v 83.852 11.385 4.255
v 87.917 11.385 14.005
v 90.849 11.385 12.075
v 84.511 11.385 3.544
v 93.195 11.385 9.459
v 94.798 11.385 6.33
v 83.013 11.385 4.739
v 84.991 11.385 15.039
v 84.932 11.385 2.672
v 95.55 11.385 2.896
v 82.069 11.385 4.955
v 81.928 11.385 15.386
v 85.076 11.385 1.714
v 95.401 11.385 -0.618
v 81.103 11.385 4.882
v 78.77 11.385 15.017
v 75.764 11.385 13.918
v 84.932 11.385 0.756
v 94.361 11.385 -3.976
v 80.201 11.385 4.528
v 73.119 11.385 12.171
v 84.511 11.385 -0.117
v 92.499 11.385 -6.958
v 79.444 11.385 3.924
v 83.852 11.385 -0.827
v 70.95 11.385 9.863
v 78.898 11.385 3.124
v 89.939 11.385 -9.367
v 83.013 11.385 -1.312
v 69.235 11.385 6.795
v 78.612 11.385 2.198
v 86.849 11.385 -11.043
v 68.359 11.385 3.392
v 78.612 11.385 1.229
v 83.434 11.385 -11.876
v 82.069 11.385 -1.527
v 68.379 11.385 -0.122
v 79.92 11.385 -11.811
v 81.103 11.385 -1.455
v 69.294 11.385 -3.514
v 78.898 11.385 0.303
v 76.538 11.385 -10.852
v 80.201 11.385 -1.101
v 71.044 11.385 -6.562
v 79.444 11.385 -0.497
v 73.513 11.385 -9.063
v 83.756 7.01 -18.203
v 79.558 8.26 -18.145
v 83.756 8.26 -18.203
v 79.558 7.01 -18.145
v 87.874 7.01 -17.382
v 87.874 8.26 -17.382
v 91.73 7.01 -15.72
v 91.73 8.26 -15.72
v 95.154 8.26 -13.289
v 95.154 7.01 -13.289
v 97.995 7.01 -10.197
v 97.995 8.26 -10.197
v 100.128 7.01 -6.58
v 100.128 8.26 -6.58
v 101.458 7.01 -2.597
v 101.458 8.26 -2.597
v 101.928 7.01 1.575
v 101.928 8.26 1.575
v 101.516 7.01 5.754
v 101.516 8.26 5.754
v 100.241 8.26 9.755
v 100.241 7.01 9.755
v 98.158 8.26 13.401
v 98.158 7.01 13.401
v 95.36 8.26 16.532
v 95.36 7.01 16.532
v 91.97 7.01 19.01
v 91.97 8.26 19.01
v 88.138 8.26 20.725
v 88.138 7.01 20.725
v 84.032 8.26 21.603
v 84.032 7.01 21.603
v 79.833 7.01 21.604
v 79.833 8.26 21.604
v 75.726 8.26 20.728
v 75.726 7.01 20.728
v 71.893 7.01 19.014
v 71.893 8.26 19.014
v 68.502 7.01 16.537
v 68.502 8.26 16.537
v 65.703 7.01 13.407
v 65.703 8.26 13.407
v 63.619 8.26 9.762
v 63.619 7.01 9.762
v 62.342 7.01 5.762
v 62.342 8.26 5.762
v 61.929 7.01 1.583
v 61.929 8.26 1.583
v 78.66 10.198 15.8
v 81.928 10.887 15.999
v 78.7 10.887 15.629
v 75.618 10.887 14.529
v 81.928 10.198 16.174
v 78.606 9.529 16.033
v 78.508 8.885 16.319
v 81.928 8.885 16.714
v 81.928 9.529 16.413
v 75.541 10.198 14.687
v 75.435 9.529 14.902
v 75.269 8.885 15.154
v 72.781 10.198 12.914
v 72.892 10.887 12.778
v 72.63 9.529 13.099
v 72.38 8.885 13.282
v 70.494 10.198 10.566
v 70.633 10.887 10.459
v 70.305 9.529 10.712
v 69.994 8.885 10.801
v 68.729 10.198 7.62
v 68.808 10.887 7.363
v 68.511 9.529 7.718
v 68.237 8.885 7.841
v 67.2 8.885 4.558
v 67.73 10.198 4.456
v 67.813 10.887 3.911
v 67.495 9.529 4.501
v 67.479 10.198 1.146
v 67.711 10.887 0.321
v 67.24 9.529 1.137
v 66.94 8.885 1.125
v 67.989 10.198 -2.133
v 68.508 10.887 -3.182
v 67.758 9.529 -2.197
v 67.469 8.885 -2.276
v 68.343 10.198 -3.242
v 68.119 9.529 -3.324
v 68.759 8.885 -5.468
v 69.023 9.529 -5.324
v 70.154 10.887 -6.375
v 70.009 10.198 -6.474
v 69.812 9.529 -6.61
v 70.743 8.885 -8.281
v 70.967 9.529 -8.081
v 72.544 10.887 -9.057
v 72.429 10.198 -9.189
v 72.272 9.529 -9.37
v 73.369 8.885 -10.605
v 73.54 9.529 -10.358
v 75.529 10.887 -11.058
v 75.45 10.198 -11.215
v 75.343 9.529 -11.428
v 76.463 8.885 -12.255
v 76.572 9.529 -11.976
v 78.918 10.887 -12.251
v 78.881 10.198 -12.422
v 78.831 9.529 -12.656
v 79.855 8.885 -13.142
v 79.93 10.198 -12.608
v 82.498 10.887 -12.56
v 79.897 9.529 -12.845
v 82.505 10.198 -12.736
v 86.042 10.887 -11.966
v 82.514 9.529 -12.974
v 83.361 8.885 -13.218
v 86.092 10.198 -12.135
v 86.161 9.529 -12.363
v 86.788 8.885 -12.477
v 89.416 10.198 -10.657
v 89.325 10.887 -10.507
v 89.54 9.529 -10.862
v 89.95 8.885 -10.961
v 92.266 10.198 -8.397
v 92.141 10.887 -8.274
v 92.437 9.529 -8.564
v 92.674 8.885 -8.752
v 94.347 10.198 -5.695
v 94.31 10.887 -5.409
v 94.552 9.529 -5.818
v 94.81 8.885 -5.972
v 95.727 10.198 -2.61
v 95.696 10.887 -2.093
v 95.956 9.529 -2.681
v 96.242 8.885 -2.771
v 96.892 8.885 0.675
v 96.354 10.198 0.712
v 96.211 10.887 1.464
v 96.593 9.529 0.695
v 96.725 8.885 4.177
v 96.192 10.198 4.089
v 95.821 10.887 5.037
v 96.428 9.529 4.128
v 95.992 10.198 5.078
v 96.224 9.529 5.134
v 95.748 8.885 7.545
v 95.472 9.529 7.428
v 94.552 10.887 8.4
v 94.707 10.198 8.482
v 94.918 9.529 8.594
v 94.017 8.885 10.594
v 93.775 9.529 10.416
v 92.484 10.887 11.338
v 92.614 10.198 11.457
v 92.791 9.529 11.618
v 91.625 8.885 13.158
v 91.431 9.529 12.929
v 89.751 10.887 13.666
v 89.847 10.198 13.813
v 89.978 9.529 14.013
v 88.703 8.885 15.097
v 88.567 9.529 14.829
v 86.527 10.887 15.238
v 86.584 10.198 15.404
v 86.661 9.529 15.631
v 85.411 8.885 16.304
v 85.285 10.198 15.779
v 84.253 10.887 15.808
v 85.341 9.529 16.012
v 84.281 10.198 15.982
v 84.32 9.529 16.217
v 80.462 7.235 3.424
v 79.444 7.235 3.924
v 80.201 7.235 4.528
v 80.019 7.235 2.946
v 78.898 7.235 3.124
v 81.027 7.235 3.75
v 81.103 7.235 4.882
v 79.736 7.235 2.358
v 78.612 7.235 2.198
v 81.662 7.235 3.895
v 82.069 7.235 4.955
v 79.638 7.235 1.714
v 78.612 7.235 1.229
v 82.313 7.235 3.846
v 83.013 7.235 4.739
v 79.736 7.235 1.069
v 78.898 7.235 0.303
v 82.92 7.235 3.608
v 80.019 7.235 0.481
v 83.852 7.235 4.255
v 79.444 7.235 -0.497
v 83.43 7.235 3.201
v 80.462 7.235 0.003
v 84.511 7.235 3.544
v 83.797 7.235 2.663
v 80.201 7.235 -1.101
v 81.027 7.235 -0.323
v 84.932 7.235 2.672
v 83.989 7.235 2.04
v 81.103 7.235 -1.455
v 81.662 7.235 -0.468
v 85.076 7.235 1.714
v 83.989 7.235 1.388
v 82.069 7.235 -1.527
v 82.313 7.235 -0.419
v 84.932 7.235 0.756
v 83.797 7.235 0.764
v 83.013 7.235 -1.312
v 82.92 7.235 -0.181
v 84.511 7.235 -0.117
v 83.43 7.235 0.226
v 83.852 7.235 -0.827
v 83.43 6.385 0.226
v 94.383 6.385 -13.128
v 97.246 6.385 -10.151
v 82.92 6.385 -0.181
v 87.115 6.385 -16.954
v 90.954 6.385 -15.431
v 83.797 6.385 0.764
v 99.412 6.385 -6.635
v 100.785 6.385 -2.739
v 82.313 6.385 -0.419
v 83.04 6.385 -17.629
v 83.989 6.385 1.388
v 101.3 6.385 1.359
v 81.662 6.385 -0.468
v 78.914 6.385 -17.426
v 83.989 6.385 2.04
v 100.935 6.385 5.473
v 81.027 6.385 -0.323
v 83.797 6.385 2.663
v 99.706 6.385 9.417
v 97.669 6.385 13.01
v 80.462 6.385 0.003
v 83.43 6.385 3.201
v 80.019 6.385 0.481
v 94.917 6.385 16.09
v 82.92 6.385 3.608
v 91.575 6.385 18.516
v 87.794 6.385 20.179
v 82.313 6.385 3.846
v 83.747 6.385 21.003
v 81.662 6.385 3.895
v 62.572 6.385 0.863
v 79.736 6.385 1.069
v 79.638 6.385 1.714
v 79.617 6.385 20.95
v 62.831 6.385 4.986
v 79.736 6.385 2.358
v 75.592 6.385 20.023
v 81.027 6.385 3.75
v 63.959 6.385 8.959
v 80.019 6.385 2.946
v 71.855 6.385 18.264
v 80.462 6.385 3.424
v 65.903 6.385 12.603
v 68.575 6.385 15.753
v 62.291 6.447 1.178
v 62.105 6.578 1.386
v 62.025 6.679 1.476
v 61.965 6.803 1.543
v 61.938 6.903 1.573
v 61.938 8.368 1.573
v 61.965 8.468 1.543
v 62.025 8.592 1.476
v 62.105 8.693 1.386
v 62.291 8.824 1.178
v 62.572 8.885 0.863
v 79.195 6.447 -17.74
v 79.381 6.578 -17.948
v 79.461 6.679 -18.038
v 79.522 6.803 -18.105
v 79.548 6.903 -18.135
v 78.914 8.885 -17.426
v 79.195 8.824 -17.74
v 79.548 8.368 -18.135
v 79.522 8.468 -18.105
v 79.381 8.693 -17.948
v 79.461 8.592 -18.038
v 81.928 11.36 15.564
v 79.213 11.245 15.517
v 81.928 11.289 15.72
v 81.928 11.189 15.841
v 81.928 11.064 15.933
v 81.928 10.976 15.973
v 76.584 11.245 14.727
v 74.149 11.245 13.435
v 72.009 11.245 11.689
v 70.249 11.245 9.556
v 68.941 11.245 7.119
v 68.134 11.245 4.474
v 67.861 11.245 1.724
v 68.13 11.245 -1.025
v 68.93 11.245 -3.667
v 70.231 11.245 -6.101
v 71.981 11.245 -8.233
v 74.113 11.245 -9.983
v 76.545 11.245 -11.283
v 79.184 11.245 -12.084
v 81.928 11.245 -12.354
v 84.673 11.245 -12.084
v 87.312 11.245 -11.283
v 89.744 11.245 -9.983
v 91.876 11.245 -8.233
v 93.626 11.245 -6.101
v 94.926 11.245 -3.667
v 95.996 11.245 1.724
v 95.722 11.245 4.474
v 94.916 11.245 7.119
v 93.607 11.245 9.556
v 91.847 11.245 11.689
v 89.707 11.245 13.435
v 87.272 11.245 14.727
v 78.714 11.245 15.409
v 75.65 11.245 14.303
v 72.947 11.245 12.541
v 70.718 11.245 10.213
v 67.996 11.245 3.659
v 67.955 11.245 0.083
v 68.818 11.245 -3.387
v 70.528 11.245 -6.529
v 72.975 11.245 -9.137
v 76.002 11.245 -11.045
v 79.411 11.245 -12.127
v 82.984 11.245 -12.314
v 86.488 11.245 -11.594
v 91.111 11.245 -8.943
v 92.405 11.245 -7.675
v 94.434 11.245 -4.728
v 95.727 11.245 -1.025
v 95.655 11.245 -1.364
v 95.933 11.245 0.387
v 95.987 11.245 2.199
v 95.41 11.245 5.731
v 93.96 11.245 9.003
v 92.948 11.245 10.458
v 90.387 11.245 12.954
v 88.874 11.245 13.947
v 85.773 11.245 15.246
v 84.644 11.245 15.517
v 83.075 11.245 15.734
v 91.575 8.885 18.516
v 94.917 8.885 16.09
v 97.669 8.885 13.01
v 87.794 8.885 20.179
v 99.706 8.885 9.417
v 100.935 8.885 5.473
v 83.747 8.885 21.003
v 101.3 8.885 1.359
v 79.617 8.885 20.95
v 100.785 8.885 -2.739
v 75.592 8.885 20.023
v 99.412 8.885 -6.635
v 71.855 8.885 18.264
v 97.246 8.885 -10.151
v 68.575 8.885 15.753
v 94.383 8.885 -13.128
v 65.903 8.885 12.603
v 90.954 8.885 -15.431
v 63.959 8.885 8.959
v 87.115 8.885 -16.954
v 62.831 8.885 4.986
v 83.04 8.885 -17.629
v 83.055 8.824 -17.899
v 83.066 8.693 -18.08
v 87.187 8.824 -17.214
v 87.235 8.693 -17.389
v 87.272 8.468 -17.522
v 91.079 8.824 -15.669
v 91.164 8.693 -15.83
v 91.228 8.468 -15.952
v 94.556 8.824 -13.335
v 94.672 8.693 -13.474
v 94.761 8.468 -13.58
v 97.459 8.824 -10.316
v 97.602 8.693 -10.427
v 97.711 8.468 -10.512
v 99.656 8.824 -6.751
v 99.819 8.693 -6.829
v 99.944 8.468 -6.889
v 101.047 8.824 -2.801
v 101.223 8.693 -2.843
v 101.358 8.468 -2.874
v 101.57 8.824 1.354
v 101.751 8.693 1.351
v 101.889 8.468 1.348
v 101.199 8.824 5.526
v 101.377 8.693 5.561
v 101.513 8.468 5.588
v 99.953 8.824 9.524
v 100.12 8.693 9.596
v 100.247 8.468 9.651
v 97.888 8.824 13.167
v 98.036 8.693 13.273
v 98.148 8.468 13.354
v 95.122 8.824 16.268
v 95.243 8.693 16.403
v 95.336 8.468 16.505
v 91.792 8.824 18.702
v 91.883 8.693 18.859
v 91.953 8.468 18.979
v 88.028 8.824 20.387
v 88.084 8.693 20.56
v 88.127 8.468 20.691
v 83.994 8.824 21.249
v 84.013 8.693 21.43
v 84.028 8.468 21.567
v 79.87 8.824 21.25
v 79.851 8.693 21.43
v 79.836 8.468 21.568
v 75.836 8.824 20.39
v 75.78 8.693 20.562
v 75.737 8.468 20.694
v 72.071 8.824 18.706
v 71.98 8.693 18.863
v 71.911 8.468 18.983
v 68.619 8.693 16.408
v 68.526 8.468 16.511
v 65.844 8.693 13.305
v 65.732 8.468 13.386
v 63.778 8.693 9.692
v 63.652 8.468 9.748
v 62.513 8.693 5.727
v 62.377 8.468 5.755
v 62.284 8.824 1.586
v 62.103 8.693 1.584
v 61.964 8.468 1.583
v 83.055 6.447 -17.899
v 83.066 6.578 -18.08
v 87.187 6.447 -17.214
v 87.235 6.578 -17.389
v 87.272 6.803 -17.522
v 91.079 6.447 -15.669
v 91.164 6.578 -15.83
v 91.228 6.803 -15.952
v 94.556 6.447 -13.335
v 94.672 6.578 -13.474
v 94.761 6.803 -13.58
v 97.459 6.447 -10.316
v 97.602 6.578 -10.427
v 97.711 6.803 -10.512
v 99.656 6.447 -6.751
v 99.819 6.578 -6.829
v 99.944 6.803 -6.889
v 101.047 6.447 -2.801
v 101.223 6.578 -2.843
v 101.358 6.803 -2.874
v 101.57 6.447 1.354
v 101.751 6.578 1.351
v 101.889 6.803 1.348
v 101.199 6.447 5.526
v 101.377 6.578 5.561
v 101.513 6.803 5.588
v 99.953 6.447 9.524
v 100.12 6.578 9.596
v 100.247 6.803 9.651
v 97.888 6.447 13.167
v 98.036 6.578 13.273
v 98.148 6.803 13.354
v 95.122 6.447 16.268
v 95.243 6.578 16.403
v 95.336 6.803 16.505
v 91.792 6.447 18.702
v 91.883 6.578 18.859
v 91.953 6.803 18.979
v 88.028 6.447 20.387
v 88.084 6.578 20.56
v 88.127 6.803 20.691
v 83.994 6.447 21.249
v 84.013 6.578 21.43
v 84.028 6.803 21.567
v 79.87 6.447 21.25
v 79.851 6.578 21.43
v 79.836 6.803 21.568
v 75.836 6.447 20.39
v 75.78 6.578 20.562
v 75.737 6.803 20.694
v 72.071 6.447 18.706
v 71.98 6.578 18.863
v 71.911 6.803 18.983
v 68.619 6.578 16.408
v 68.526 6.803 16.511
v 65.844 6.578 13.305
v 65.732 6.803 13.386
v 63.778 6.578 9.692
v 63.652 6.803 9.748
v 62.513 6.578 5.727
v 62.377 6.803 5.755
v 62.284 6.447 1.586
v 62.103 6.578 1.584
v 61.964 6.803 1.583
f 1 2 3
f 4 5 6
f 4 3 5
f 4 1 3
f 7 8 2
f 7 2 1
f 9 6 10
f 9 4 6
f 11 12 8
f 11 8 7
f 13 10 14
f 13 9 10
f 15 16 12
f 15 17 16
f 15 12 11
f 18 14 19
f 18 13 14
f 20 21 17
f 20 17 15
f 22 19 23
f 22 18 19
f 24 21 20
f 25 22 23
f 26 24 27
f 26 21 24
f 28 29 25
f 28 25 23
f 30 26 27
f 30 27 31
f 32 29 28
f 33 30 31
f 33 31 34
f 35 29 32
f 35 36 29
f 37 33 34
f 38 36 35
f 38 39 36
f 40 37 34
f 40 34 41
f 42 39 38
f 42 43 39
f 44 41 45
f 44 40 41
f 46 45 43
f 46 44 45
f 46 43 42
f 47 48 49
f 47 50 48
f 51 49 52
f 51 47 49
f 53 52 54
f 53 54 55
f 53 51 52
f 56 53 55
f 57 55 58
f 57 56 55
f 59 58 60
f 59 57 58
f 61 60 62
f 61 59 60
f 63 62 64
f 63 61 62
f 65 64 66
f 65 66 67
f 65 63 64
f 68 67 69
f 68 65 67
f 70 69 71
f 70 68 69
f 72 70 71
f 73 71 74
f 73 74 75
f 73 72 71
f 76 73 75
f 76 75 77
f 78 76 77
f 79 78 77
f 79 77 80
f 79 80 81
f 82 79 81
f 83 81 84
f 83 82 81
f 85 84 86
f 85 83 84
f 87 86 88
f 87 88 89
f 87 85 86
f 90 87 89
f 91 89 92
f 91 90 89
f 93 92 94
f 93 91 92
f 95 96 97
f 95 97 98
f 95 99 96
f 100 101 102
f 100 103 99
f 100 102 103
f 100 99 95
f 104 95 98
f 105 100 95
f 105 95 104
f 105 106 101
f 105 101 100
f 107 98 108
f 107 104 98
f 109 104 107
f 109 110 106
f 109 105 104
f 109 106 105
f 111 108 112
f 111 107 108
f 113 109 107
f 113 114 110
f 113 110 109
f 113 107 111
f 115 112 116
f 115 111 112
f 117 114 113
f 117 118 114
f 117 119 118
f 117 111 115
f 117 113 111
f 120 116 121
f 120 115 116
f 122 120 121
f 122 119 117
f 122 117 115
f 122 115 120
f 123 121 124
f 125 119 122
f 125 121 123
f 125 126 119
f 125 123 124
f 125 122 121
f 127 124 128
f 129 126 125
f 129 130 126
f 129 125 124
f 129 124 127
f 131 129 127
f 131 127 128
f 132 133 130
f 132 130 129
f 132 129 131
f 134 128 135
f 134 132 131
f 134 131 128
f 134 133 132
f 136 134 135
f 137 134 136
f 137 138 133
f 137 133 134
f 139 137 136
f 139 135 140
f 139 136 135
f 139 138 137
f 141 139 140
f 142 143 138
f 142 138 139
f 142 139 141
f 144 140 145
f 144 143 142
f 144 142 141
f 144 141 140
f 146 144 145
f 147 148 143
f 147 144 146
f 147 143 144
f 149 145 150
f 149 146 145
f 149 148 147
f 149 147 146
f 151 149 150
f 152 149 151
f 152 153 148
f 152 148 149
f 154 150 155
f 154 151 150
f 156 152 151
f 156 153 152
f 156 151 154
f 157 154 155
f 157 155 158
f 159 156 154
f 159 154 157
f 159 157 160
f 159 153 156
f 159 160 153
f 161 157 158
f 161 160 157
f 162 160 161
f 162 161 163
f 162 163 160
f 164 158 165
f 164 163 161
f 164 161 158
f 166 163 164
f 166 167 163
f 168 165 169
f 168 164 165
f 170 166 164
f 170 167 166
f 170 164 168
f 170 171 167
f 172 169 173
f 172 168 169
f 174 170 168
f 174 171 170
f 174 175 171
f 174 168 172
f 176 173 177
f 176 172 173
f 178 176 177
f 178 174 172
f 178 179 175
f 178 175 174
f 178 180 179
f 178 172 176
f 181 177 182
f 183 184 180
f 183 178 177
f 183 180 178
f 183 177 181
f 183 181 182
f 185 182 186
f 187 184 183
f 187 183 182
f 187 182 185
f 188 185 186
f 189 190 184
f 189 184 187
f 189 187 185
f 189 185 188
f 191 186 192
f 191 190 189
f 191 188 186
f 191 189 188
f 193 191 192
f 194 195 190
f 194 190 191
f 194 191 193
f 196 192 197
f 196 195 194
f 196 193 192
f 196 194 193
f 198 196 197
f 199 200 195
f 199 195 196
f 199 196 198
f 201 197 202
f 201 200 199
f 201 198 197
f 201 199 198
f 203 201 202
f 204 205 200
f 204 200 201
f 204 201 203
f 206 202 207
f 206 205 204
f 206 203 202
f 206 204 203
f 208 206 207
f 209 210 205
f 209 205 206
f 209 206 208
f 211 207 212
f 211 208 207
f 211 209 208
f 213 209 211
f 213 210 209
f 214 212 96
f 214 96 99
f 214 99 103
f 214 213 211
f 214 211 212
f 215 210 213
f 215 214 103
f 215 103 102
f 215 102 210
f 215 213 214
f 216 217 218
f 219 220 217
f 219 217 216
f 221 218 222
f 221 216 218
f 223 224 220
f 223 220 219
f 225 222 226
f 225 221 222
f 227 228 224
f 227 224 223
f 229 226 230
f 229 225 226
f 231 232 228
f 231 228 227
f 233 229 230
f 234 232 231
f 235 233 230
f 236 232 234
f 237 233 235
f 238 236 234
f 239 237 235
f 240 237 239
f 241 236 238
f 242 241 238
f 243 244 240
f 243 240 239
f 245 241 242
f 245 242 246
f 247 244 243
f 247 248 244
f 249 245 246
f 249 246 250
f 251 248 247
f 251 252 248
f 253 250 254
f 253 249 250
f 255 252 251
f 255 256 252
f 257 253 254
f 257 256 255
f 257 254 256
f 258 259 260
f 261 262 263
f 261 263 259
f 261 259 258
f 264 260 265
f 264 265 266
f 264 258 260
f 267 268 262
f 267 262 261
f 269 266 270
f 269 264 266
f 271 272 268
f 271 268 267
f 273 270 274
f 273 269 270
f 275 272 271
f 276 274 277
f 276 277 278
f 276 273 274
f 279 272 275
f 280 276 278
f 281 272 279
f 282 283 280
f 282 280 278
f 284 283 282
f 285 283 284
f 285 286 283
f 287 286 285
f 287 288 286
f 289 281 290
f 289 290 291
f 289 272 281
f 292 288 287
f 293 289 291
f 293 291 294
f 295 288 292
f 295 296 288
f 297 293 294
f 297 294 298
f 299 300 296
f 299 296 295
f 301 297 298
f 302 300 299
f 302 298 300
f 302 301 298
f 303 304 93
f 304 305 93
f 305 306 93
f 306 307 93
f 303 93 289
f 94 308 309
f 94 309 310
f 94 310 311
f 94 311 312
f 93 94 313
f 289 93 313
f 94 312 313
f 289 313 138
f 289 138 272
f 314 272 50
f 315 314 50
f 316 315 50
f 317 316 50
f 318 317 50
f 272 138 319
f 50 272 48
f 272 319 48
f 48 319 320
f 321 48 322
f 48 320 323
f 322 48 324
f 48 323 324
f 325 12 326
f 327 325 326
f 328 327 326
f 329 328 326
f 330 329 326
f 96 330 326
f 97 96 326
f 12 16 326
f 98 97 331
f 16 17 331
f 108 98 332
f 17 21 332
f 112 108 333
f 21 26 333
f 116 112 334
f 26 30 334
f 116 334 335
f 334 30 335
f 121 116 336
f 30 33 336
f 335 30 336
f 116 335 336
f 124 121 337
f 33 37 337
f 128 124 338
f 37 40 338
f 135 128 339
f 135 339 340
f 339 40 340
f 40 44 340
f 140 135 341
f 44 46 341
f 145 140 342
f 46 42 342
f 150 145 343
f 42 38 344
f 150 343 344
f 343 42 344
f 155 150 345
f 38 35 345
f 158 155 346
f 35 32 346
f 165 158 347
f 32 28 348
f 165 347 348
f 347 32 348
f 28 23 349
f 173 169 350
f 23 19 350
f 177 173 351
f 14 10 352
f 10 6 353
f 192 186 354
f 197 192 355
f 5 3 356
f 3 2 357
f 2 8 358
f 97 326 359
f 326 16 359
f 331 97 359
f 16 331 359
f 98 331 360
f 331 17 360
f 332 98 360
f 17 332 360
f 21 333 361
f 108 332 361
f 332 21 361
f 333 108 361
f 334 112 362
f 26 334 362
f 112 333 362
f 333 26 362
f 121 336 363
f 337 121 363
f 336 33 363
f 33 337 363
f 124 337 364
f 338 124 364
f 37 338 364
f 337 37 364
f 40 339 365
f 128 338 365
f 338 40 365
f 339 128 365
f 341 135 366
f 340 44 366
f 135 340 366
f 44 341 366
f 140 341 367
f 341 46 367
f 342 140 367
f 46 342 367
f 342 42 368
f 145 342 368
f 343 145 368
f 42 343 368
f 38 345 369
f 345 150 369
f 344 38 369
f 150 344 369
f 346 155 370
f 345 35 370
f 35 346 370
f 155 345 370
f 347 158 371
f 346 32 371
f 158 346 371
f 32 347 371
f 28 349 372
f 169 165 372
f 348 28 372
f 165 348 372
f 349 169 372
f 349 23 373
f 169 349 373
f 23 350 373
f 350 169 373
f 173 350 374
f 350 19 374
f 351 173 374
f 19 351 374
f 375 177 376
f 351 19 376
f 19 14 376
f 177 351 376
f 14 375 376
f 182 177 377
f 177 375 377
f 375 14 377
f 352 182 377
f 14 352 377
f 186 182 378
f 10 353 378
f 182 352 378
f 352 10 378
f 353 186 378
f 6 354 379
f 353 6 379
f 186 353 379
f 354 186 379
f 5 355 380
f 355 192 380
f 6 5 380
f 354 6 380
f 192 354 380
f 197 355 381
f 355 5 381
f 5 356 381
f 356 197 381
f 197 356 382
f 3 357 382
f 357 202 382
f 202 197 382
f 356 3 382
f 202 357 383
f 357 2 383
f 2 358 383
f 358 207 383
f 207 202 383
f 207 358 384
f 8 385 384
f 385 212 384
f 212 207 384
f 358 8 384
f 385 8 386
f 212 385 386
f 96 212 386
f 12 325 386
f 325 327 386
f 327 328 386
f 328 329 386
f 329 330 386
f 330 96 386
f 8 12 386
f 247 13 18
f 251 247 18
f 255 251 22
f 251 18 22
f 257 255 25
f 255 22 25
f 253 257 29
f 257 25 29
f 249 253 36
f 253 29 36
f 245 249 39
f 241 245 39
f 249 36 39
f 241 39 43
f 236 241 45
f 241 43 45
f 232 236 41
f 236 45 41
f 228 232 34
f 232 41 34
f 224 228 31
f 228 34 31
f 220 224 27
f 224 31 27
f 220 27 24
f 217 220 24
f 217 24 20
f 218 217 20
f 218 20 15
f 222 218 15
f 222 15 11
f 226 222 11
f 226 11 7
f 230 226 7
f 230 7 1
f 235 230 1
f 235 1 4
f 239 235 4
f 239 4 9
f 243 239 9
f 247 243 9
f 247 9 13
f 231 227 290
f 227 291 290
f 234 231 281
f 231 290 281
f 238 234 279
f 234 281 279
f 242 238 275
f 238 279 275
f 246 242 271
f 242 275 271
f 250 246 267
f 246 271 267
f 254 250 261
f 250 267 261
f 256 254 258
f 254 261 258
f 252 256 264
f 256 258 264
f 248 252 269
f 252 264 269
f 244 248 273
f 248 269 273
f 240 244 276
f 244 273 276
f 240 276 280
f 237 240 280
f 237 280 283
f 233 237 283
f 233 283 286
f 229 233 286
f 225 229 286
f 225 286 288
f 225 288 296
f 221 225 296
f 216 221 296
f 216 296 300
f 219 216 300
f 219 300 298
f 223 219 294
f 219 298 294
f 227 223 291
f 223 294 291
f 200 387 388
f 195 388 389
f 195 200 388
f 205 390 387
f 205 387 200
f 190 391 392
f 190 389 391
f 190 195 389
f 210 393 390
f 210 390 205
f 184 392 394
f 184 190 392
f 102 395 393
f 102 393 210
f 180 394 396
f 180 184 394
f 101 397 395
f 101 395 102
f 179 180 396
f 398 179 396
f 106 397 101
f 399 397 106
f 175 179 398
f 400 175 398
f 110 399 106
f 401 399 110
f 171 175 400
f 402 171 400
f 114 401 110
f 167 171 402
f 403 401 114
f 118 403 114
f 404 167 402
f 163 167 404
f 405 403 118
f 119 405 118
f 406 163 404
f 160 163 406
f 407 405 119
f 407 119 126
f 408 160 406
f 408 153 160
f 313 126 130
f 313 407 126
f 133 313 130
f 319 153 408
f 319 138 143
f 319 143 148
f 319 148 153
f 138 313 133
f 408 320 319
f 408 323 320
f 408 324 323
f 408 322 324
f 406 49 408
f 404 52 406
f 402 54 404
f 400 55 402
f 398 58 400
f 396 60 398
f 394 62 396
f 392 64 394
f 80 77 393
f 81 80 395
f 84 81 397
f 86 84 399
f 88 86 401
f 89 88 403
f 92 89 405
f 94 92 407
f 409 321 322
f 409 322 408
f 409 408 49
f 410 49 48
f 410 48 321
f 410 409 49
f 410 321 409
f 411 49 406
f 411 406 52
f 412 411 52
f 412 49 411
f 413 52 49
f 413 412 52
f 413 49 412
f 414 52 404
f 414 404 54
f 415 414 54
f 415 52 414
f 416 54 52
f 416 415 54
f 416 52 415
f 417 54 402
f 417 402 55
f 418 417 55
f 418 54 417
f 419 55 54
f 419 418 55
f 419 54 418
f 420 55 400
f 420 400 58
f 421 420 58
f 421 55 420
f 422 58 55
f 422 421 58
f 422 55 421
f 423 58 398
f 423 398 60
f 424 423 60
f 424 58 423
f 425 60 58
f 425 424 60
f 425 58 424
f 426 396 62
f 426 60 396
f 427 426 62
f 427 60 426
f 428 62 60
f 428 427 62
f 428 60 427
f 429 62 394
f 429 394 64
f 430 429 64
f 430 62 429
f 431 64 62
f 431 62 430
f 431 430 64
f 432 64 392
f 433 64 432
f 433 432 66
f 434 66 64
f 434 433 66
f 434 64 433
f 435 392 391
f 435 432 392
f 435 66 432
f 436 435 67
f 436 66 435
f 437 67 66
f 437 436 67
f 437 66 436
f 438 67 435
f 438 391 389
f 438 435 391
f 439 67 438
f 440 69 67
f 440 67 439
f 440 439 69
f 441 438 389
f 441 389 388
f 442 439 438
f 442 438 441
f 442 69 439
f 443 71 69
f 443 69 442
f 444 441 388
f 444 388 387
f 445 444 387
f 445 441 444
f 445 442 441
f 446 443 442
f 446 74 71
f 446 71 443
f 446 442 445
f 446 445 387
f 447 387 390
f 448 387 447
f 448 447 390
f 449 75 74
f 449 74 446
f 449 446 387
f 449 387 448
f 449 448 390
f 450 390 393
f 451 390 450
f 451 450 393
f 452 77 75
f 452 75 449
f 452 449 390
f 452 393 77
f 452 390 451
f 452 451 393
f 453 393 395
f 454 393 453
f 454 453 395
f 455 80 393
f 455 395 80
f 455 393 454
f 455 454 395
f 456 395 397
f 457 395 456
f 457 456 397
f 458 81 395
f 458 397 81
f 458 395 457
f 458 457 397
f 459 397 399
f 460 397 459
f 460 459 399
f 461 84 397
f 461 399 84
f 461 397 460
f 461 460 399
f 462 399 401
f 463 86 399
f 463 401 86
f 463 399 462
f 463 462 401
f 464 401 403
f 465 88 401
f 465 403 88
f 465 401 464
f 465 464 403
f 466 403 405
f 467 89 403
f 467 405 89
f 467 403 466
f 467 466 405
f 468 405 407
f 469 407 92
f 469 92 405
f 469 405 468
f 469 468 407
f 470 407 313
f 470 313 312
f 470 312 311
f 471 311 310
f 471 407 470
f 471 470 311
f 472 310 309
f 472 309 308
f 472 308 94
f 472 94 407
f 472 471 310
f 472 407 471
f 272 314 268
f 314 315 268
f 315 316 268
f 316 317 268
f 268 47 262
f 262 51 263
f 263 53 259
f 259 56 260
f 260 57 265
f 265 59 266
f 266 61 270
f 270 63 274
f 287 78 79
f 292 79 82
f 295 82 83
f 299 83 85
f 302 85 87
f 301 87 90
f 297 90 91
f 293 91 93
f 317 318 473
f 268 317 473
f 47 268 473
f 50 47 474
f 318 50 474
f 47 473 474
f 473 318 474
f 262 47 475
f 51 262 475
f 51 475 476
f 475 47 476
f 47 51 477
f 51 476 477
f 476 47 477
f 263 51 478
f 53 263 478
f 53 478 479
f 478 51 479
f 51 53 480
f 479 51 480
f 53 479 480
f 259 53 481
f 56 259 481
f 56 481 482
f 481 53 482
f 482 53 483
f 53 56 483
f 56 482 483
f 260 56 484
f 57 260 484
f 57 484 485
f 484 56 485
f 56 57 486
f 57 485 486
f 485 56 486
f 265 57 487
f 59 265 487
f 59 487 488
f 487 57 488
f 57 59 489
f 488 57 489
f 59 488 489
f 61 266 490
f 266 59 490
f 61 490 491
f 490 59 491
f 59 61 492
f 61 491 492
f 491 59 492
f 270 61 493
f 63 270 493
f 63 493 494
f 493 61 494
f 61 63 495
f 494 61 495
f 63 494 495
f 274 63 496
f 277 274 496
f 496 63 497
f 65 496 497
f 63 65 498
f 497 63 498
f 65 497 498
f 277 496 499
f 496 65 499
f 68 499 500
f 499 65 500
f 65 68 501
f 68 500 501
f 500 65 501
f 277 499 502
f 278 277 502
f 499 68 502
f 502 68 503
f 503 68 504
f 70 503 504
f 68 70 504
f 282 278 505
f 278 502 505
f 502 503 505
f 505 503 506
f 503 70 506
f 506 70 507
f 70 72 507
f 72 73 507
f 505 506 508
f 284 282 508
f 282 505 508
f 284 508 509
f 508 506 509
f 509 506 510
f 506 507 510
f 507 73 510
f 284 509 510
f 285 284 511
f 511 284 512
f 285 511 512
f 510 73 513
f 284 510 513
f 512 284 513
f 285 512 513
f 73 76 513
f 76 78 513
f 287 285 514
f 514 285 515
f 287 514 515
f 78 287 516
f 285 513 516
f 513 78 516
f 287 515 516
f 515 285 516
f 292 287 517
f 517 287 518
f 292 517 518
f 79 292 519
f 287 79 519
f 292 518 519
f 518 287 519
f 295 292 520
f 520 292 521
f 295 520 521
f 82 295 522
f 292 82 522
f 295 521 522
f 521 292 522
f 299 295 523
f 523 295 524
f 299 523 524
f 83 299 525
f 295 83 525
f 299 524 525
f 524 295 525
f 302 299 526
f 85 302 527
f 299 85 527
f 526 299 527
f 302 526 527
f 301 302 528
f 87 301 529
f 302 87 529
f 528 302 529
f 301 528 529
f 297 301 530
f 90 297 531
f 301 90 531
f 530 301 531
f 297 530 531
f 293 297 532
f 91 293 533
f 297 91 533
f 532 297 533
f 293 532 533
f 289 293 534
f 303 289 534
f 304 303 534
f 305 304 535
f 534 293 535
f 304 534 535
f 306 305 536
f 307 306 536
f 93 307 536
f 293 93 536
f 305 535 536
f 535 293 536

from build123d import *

# Parameters (mm, degrees)
CONG_1_R                                           = 2.5
ENL_V_MAT_EXTRU_1_REACH                            = 181.165
CHAMBRAGE_POUR_VIS_T_TE_HEXAGONALE_M16_D           = 17.5
CHAMBRAGE_POUR_VIS_T_TE_HEXAGONALE_M16_DEPTH       = 20
CHAMBRAGE_POUR_VIS_T_TE_HEXAGONALE_M16_CBORE_D     = 26
CHAMBRAGE_POUR_VIS_T_TE_HEXAGONALE_M16_CBORE_DEPTH = 16.6
CHAMBRAGE_POUR_VIS_T_TE_HEXAGONALE_M16_TIP         = 5.257530416
ECHELLE1_SCALE                                     = 0.25


with BuildPart() as part:
    # Esquisse1 → Révolution1 (revolve)
    with BuildSketch(Plane.XY, mode=Mode.PRIVATE) as r_volution1_sk:
        with BuildLine():
            Line((0, 0), (80, 0))
            Line((80, 0), (80, 20))
            Line((80, 20), (23.203122076, 20))
            ThreePointArc((23.203122076, 20), (22.035240729, 14.861087101), (20, 10))
            Line((20, 10), (0, 10))
            Line((0, 10), (0, 0))
        make_face()
    revolve(r_volution1_sk.sketch.rotate(Axis((80, 20, 0), (0, -1, 0)), 270), axis=Axis((80, 20, 0), (0, -1, 0)))

    # Congé1
    cong_1_edges = [part.edges().sort_by_distance(p)[0] for p in [
        (80, 10, -80),
        (80, 20, -56.796877924),
        (80, 0, -80),
    ]]
    fillet(cong_1_edges, radius=CONG_1_R)

    # Esquisse3 → Enlèv. mat.-Extru.1 (cut, up to next)
    with BuildSketch(Plane(origin=(0, 10, 0), x_dir=(1, 0, 0), z_dir=(0, 1, 0)), mode=Mode.PRIVATE) as enl_v_mat_extru_1_sk1:
        with BuildLine():
            Line((0.001700291, 0.521578063), (70.517699728, 79.436049635))
            ThreePointArc((70.517699728, 79.436049635), (20.346266679, 53.305085132), (0.001700291, 0.521578063))
        make_face()
    enl_v_mat_extru_1_tool1 = extrude(enl_v_mat_extru_1_sk1.sketch, amount=-ENL_V_MAT_EXTRU_1_REACH, mode=Mode.PRIVATE) & part.part
    add(enl_v_mat_extru_1_tool1.solids().sort_by_distance((29.225405, 10, -45.370909))[0], mode=Mode.SUBTRACT)

    # Chambrage pour vis à tête hexagonale M161
    with Locations(Plane(origin=(0, 20, 0), x_dir=(1, 0, 0), z_dir=(0, 1, 0))):
        with Locations((79.591089576, 0)):
            CounterBoreHole(CHAMBRAGE_POUR_VIS_T_TE_HEXAGONALE_M16_D / 2, CHAMBRAGE_POUR_VIS_T_TE_HEXAGONALE_M16_CBORE_D / 2, CHAMBRAGE_POUR_VIS_T_TE_HEXAGONALE_M16_CBORE_DEPTH, depth=CHAMBRAGE_POUR_VIS_T_TE_HEXAGONALE_M16_DEPTH)
            with Locations((0, 0, -(CHAMBRAGE_POUR_VIS_T_TE_HEXAGONALE_M16_DEPTH + CHAMBRAGE_POUR_VIS_T_TE_HEXAGONALE_M16_TIP / 2))):  # 118° drill point
                Cone(0, CHAMBRAGE_POUR_VIS_T_TE_HEXAGONALE_M16_D / 2, CHAMBRAGE_POUR_VIS_T_TE_HEXAGONALE_M16_TIP, mode=Mode.SUBTRACT)


with BuildPart() as part_1:
    # Echelle1: scaled about (82.57091432, 8.513984125, 2.2848071)
    add(part.part.scale(ECHELLE1_SCALE).moved(Location((61.92818574, 6.385488094, 1.713605325))))


solid = part_1.part
